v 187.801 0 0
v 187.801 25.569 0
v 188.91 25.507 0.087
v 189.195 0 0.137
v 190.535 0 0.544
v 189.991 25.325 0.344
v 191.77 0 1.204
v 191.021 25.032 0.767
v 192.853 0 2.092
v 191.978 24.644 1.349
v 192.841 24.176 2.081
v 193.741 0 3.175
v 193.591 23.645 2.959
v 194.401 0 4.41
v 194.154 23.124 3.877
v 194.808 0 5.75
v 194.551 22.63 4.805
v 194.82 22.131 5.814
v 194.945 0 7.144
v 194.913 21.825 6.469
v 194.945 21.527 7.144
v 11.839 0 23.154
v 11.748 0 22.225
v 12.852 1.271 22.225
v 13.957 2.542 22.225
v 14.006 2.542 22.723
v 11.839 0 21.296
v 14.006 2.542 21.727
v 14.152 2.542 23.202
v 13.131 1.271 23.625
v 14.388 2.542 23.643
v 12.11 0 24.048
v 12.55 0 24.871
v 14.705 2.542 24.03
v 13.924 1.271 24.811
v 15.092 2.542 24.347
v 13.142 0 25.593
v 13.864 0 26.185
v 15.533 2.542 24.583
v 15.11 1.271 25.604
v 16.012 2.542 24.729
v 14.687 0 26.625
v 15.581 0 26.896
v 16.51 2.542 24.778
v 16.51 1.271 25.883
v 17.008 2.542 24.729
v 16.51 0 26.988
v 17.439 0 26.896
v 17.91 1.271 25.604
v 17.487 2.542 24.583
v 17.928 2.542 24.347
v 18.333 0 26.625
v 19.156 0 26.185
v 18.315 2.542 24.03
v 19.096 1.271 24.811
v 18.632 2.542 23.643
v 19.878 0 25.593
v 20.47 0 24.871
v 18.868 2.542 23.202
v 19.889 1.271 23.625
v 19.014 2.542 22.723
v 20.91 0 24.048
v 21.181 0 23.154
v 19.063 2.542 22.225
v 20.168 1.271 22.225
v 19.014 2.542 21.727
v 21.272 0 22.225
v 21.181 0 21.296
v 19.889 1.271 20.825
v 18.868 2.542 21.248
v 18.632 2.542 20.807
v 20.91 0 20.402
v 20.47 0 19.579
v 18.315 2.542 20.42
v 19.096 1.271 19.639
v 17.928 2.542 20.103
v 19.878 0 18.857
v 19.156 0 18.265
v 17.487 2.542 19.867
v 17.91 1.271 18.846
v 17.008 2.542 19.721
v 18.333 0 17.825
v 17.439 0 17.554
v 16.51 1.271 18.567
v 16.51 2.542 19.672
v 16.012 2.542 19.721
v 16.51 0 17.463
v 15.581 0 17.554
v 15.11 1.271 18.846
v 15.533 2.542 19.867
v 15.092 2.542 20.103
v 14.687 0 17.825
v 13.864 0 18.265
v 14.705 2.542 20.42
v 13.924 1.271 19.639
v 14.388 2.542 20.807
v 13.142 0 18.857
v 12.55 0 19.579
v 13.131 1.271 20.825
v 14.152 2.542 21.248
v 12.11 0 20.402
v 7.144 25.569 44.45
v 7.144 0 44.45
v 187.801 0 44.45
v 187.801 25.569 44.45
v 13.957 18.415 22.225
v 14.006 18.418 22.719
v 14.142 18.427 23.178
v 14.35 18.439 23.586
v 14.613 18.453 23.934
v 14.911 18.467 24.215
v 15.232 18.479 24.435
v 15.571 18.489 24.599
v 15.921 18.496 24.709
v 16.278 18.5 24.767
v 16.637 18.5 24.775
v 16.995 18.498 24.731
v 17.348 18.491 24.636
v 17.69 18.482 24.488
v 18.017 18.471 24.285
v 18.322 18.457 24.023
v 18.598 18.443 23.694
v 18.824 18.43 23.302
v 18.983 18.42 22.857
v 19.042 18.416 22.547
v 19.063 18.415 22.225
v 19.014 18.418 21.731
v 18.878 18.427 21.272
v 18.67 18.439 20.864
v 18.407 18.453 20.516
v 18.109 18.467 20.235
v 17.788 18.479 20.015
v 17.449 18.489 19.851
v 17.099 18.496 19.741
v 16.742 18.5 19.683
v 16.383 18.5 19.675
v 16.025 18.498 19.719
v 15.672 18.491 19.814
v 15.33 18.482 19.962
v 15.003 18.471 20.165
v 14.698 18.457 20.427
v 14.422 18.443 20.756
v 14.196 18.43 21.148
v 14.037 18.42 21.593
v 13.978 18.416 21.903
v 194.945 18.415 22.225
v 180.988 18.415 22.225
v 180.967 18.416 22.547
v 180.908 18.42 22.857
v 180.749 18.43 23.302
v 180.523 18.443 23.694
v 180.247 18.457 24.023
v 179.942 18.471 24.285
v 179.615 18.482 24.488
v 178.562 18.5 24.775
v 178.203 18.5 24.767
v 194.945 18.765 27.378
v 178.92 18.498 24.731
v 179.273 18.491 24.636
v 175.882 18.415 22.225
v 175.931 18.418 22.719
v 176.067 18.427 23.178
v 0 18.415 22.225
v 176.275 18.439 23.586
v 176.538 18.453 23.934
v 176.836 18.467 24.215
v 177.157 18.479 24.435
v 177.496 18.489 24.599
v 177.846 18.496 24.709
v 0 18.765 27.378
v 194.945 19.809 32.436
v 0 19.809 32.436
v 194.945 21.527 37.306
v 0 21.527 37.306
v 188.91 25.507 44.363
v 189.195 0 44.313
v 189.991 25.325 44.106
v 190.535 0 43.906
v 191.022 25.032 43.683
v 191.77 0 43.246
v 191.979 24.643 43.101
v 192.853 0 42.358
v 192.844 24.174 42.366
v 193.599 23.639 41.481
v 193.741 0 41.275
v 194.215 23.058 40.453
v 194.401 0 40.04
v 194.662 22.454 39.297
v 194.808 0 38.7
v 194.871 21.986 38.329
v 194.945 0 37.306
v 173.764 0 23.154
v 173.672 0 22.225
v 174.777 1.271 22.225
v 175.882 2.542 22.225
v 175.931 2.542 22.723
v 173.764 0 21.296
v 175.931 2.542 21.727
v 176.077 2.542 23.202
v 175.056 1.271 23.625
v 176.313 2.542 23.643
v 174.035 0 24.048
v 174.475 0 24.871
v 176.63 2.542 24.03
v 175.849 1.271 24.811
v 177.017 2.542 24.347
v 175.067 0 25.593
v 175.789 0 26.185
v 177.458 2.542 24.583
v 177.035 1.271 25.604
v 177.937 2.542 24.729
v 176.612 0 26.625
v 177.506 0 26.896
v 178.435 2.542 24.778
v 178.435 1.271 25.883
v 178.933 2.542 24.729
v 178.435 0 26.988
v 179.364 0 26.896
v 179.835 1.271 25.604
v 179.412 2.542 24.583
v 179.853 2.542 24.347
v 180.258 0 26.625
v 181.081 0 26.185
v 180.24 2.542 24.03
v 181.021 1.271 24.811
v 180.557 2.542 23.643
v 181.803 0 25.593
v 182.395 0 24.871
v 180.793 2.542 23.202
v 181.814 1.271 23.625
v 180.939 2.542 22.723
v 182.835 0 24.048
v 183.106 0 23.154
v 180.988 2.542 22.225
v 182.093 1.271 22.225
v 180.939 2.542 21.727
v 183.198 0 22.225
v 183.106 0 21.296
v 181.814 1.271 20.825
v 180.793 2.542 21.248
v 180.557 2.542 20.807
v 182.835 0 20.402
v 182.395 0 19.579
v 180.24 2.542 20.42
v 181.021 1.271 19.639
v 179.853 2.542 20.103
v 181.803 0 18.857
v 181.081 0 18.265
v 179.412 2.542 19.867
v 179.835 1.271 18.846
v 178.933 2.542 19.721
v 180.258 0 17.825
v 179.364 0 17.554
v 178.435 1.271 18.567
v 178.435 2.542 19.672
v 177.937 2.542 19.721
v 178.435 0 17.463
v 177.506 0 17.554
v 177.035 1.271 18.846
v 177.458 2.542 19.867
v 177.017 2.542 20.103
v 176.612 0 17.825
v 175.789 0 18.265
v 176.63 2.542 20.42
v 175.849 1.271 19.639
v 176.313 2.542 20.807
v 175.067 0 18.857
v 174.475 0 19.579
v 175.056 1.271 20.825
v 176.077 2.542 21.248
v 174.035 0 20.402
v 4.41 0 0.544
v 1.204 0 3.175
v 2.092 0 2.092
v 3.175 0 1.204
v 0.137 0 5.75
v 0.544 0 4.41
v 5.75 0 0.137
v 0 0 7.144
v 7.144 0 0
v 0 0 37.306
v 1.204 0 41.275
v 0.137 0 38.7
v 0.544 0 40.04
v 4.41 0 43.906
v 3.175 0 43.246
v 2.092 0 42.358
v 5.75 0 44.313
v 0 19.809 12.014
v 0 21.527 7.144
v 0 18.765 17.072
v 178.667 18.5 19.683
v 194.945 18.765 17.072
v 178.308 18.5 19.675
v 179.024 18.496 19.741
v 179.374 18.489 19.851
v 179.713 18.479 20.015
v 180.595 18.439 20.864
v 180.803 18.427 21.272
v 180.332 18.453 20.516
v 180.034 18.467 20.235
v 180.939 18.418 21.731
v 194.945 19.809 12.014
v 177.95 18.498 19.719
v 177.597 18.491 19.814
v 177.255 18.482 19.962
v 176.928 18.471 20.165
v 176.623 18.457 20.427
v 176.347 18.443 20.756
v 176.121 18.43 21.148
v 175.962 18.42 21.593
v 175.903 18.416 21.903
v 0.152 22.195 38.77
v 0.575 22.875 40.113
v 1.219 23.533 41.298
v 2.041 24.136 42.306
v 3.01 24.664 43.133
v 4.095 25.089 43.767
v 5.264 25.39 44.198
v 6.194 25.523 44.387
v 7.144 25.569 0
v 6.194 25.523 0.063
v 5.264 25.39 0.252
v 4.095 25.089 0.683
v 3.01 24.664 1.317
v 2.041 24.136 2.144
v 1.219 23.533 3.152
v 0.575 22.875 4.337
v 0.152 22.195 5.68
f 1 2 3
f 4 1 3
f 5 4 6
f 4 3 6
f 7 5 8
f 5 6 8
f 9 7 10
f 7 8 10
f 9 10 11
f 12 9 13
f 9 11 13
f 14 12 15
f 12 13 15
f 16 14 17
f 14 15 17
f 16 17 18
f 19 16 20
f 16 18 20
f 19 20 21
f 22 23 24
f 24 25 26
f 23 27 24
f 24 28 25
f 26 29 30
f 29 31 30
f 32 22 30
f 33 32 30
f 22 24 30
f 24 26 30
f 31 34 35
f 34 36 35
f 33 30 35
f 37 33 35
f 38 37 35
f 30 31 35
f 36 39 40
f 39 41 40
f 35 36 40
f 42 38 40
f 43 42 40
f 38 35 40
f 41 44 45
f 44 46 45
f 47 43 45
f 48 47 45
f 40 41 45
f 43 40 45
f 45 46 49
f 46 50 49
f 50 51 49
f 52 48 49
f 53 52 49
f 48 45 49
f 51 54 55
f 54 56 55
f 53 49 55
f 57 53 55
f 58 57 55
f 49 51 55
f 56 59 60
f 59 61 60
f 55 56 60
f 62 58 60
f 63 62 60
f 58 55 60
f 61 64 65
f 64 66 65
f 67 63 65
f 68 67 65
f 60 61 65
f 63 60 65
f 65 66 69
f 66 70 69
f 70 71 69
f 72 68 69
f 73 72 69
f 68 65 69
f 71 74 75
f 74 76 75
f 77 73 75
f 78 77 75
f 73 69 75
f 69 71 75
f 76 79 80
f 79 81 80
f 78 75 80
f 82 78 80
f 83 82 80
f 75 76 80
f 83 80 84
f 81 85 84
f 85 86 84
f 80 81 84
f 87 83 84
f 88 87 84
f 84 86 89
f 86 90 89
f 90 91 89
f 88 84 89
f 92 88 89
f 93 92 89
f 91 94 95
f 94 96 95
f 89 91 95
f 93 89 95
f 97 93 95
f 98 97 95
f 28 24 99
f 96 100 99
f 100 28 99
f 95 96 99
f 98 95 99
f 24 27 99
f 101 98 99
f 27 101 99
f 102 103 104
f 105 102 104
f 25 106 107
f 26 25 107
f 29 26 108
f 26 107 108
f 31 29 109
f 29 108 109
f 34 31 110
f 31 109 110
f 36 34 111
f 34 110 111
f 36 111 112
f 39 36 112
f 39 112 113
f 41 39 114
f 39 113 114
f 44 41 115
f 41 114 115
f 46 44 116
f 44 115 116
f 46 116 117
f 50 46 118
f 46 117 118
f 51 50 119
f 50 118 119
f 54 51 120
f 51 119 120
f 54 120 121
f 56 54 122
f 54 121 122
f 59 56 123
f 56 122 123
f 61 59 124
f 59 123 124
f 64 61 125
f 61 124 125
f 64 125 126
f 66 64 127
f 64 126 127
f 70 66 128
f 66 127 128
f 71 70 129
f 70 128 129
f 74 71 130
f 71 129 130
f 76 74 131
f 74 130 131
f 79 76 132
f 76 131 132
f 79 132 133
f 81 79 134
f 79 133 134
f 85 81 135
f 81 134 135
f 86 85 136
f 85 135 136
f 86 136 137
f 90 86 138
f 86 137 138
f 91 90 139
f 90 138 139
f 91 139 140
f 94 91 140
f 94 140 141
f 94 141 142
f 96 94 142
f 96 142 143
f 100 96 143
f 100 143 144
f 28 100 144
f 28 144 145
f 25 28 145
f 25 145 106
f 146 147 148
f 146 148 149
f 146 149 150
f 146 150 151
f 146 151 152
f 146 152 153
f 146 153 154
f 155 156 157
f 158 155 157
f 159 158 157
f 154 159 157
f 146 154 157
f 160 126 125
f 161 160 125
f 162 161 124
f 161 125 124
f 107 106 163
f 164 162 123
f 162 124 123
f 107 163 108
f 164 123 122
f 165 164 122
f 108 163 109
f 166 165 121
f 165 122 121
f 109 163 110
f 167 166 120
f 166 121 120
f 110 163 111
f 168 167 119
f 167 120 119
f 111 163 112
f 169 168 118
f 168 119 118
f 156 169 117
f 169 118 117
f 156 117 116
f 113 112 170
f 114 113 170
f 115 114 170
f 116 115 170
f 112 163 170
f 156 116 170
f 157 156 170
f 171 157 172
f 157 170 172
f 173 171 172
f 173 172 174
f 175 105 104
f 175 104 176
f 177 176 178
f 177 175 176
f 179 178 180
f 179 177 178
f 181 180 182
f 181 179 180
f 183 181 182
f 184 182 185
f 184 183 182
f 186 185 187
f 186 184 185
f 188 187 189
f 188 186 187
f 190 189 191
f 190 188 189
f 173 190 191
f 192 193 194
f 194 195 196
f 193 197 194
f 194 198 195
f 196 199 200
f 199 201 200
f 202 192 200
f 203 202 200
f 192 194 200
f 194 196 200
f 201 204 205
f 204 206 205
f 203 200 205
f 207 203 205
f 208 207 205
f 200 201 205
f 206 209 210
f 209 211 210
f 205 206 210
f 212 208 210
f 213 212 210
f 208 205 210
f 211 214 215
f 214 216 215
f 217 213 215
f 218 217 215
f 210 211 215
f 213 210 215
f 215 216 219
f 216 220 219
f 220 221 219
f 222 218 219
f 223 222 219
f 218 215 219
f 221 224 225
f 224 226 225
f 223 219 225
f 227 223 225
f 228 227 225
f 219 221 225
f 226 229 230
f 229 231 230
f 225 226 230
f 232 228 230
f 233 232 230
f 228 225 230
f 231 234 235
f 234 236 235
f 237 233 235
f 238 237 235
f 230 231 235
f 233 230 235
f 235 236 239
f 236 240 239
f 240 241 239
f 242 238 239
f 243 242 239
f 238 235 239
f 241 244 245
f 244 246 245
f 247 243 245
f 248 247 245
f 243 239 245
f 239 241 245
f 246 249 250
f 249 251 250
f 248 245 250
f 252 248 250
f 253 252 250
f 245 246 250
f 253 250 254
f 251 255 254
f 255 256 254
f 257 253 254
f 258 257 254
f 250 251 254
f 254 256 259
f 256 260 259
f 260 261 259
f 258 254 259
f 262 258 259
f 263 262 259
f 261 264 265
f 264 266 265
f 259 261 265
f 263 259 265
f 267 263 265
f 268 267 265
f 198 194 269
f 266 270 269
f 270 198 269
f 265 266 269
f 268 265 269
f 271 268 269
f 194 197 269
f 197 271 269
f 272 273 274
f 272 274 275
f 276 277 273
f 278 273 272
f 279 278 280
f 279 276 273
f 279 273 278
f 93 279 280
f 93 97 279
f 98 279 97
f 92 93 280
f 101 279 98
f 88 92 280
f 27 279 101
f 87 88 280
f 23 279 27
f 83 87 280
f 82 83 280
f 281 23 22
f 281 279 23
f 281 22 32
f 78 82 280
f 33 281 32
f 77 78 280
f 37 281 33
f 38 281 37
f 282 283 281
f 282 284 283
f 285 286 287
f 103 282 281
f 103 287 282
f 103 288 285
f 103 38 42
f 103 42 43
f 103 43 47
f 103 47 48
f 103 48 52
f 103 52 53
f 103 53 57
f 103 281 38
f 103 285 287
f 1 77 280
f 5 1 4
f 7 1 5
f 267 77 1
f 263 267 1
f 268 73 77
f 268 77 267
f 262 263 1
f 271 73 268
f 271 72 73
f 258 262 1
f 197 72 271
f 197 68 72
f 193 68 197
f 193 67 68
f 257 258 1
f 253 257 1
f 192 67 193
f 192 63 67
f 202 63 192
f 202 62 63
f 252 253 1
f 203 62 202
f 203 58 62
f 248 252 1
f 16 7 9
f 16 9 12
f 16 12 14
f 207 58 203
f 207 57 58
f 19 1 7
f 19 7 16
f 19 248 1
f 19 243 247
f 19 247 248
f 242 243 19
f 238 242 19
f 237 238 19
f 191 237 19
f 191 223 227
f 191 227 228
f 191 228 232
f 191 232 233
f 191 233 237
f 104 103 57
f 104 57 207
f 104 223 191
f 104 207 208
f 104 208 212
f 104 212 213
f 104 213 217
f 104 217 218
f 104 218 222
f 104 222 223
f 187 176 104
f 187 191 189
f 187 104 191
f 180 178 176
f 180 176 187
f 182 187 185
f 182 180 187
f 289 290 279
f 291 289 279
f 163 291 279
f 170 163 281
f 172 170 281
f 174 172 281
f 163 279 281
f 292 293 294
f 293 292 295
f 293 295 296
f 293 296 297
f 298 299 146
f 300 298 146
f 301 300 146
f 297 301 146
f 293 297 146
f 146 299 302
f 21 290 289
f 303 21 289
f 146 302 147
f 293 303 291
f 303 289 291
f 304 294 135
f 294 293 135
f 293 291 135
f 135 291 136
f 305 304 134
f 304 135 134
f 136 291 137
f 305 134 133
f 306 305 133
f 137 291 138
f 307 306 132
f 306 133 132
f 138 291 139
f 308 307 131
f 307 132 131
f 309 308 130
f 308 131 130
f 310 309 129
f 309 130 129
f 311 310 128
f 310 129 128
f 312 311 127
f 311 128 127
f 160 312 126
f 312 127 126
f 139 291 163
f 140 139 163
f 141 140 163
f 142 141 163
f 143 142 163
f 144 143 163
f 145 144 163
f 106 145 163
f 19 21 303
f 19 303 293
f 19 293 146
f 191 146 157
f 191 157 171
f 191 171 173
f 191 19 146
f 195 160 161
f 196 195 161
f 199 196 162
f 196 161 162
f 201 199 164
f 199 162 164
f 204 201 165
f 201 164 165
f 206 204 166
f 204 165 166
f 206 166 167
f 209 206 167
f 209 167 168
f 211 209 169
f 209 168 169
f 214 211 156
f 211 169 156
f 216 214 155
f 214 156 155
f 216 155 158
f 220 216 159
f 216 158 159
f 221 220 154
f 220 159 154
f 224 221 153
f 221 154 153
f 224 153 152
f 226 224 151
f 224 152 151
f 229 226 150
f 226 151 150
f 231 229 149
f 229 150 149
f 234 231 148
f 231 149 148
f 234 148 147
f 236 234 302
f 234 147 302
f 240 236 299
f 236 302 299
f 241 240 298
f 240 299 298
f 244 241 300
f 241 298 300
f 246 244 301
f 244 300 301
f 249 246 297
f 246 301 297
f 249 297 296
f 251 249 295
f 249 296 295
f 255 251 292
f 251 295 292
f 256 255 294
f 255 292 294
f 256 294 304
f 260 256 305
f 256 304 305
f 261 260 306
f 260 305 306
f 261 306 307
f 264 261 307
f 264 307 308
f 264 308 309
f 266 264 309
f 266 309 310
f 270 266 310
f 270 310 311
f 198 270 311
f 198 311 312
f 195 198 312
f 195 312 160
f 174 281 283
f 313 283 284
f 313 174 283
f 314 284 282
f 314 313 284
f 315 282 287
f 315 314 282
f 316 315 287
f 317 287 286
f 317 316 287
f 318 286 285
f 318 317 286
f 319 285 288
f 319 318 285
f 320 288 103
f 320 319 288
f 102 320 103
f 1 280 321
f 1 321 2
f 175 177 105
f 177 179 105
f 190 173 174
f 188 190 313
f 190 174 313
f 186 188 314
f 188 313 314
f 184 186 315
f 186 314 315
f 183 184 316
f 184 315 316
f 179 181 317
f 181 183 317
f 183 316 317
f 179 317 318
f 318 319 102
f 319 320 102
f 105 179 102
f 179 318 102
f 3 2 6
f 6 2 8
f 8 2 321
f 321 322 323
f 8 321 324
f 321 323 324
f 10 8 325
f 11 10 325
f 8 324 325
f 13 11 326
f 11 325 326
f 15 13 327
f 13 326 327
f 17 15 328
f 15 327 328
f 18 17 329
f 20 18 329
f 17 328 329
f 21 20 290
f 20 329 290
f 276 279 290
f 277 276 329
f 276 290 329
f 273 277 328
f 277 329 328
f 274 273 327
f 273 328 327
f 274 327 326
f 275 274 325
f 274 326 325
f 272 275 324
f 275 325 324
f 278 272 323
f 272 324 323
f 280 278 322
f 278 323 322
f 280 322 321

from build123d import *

# Parameters (mm, degrees)
F0_W           = 194.945
F0_H           = 44.45
F1_DEPTH       = 40.64
F2_D           = 5.1054
F2_DEPTH       = 25.4
F2_CSINK_D     = 9.525
F2_CSINK_ANGLE = 82
F2_TIP         = 1.5338169022
F3_R           = 7.14375
F5_DEPTH       = 194.946


with BuildPart() as f1:
    # F0 (on Front) → F1 (new body)
    with BuildSketch(Plane.XZ):
        with Locations((97.4725, 22.225)):
            Rectangle(F0_W, F0_H)
    extrude(amount=-F1_DEPTH)

    # F2
    with Locations(Plane.XZ):
        with Locations((16.51, 22.225), (178.435, 22.225)):
            CounterSinkHole(F2_D / 2, F2_CSINK_D / 2, depth=F2_DEPTH, counter_sink_angle=F2_CSINK_ANGLE)
            with Locations((0, 0, -(F2_DEPTH + F2_TIP / 2))):  # 118° drill point
                Cone(0, F2_D / 2, F2_TIP, mode=Mode.SUBTRACT)

    # F3
    f3_edges = [f1.edges().sort_by_distance(p)[0] for p in [
        (0, 20.32, 44.45),
        (194.945, 20.32, 44.45),
        (0, 20.32, 0),
        (194.945, 20.32, 0),
    ]]
    fillet(f3_edges, radius=F3_R)

    # F4 (on face) → F5 (cut, through all)
    with BuildSketch(Plane(origin=(0, 0, 0), x_dir=(0, -1, 0), z_dir=(-1, 0, 0))):
        with BuildLine():
            Line((-40.64, 7.14375), (-40.64, 22.225))
            Line((-40.64, 22.225), (-40.64, 37.30625))
            Line((-40.64, 37.30625), (-21.5269177657, 37.30625))
            ThreePointArc((-21.5269177657, 37.30625), (-94.615, 22.225), (-21.5269177657, 7.14375))
            Line((-21.5269177657, 7.14375), (-40.64, 7.14375))
        make_face()
        with BuildLine():
            Line((-40.64, 37.30625), (-40.64, 22.225))
            Line((-40.64, 22.225), (-18.415, 22.225))
            ThreePointArc((-18.415, 22.225), (-19.2010888332, 29.9244826732), (-21.5269177657, 37.30625))
            Line((-21.5269177657, 37.30625), (-40.64, 37.30625))
        make_face()
        with BuildLine():
            Line((-18.415, 22.225), (-40.64, 22.225))
            Line((-40.64, 22.225), (-40.64, 7.14375))
            Line((-40.64, 7.14375), (-21.5269177657, 7.14375))
            ThreePointArc((-21.5269177657, 7.14375), (-19.2010888332, 14.5255173268), (-18.415, 22.225))
        make_face()
    extrude(amount=-F5_DEPTH, mode=Mode.SUBTRACT)


solid = f1.part
